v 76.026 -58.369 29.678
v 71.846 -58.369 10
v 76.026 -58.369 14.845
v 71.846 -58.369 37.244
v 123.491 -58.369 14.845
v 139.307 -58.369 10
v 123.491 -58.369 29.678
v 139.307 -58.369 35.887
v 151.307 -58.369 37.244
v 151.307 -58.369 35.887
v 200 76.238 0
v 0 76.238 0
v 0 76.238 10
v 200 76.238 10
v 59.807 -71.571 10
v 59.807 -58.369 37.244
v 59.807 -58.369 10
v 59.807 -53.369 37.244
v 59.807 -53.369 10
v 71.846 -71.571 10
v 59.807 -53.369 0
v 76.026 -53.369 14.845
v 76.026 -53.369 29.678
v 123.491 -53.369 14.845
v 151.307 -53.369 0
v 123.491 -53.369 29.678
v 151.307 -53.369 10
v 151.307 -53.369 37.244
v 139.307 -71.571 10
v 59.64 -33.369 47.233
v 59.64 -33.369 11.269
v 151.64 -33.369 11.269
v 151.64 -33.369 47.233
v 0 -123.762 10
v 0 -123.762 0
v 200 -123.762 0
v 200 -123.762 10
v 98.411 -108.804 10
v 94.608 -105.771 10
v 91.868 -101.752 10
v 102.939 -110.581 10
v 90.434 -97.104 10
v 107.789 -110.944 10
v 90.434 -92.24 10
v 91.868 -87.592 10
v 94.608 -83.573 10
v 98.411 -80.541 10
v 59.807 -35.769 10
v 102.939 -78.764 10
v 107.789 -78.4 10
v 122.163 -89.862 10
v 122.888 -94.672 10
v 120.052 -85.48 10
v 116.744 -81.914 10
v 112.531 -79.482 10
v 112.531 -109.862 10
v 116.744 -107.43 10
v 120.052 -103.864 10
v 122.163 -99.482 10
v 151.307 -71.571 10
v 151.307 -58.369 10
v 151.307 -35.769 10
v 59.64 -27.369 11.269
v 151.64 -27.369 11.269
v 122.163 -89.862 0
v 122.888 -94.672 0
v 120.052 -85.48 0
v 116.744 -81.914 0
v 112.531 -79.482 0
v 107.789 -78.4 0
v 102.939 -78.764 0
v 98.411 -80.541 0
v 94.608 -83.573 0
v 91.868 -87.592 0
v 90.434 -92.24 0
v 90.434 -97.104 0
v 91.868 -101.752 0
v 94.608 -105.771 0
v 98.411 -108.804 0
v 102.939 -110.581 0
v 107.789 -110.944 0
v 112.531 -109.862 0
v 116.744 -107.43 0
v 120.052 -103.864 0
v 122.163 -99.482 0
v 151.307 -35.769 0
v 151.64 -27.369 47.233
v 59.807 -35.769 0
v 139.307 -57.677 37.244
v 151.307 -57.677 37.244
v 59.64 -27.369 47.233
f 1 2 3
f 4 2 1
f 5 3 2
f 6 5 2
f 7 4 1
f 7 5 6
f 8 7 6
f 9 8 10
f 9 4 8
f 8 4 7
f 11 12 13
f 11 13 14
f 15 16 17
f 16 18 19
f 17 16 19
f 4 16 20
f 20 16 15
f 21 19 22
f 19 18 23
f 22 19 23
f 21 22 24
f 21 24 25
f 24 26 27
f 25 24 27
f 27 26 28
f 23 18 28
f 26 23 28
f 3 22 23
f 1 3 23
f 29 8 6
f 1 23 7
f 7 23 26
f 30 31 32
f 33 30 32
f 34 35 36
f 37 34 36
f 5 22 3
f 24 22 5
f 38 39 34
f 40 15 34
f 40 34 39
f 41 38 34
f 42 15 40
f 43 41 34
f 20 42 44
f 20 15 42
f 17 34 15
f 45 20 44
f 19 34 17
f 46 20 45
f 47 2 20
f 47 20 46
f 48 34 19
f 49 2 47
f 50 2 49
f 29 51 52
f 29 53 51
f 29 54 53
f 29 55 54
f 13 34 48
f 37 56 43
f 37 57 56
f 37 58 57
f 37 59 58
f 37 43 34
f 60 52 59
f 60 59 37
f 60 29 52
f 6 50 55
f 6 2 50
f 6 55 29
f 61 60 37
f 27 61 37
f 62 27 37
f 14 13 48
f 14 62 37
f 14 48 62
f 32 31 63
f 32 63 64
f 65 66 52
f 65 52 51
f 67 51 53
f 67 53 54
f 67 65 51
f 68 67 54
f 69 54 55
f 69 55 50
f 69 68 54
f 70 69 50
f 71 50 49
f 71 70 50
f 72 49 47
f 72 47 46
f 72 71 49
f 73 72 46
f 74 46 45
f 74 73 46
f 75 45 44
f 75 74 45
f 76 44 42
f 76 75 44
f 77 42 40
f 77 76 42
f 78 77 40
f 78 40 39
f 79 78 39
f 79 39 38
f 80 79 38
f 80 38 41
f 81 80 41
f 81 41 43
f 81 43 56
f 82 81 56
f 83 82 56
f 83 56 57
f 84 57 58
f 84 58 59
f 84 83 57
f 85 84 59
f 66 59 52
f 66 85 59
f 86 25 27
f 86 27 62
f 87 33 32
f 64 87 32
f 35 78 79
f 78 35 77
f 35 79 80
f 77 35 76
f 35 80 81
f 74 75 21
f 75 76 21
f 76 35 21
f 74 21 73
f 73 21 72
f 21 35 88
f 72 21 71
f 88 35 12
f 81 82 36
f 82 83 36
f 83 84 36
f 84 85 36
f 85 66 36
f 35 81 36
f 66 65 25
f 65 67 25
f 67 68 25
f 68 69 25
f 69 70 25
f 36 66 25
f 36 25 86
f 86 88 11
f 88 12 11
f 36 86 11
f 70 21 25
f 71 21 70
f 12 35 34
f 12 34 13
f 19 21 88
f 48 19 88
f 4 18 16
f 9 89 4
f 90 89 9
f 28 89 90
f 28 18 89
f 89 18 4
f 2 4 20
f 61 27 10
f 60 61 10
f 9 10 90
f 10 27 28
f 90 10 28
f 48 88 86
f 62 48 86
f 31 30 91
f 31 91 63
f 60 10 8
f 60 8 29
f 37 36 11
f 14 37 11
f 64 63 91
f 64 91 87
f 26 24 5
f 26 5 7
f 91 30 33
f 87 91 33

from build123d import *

# Parameters (mm, degrees)
SKETCH1_W            = 200
SKETCH1_H            = 200
SKETCH1_R            = 16.317818037
SKETCH1_W_2          = 91.5
SKETCH1_H_2          = 17.6
BOSS_EXTRUDE1_DEPTH  = 10
SKETCH2_W            = 91.5
SKETCH2_H            = 27.244287947
SKETCH2_W_2          = 47.464374426
SKETCH2_H_2          = 14.833412225
BOSS_EXTRUDE2_DEPTH  = 5
BOSS_EXTRUDE3_DEPTH  = 12.038189492
BOSS_EXTRUDE4_DEPTH  = 12
SKETCH8_W            = 92.000196745
SKETCH8_H            = 35.96348769
BOSS_EXTRUDE10_DEPTH = 6


with BuildPart() as part:
    # Sketch1 → Boss-Extrude1 (new body)
    with BuildSketch(Plane.XY):
        with Locations((100, -23.762376238)):
            Rectangle(SKETCH1_W, SKETCH1_H)
        with Locations((106.569920284, -94.672205515)):
            Circle(SKETCH1_R, mode=Mode.SUBTRACT)
        with Locations((105.557336771, -44.56947193)):
            Rectangle(SKETCH1_W_2, SKETCH1_H_2, mode=Mode.SUBTRACT)
    extrude(amount=BOSS_EXTRUDE1_DEPTH)

    # Sketch2 → Boss-Extrude2 (add)
    with BuildSketch(Plane.XZ.offset(53.36947193)):
        with Locations((105.557336771, 23.622143974)):
            Rectangle(SKETCH2_W, SKETCH2_H)
        with Locations((99.758455932, 22.261354849)):
            Rectangle(SKETCH2_W_2, SKETCH2_H_2, mode=Mode.SUBTRACT)
    extrude(amount=BOSS_EXTRUDE2_DEPTH)

    # Sketch5 → Boss-Extrude3 (add)
    with BuildSketch(Plane.ZY.offset(-59.807336771)):
        Polygon((37.244287947, -58.36947193), (10, -71.570582827), (10, -58.36947193), align=None)
    extrude(amount=-BOSS_EXTRUDE3_DEPTH)

    # Sketch6 → Boss-Extrude4 (add)
    with BuildSketch(Plane(origin=(151.307336771, 0, 0), x_dir=(0, 0, -1), z_dir=(1, 0, 0))):
        Polygon((-37.244287947, -57.677457741), (-10, -71.570582827), (-10, -58.36947193), align=None)
    extrude(amount=-BOSS_EXTRUDE4_DEPTH)


with BuildPart() as body_2:
    # Sketch8 → Boss-Extrude10 (new body)
    with BuildSketch(Plane(origin=(0, -33.36947193, 0), x_dir=(1, 0, 0), z_dir=(0, 1, 0))):
        with Locations((105.640351876, -29.251136539)):
            Rectangle(SKETCH8_W, SKETCH8_H)
    extrude(amount=BOSS_EXTRUDE10_DEPTH)


solid = Compound([part.part, body_2.part])
